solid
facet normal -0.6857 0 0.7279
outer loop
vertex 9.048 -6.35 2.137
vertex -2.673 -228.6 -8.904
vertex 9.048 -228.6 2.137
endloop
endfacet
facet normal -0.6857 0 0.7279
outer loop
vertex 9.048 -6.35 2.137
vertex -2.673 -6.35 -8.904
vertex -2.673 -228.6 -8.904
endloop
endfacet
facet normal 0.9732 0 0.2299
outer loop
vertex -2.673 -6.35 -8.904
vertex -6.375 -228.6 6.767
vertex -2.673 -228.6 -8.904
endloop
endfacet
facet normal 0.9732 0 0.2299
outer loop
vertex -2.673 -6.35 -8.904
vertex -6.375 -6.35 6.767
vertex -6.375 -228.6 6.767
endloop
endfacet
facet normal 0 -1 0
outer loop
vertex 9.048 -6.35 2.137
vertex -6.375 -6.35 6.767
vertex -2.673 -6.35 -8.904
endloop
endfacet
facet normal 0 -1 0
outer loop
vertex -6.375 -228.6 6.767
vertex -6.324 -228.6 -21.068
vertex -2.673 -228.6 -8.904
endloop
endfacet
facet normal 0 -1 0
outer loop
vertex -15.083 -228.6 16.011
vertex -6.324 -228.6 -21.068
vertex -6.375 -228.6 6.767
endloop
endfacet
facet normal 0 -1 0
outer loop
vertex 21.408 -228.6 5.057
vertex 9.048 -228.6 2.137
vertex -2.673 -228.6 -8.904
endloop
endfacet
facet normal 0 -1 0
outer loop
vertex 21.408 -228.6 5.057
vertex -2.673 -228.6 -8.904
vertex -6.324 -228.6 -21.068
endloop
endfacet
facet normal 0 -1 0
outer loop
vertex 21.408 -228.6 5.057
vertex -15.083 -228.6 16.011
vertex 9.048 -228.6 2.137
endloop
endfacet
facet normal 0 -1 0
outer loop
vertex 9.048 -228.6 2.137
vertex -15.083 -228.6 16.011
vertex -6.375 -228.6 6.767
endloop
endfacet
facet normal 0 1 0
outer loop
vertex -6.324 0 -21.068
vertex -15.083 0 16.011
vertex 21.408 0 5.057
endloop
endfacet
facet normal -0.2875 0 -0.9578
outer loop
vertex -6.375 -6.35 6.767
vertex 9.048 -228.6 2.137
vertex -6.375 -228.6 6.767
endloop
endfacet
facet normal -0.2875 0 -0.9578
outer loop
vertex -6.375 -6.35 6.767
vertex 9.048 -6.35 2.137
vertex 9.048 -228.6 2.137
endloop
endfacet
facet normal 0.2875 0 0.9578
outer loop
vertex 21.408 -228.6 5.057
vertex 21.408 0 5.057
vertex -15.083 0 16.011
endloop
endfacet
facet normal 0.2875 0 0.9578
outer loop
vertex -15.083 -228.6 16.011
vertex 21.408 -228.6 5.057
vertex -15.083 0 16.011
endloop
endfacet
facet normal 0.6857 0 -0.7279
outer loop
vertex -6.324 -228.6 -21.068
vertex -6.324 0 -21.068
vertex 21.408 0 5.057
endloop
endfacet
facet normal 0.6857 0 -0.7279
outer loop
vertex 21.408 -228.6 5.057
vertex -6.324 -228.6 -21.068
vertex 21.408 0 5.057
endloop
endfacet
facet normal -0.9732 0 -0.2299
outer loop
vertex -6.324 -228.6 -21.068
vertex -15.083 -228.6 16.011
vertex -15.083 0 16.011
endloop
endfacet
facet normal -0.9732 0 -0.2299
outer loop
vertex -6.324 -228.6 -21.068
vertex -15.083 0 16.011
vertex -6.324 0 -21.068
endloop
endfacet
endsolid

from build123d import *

# Parameters (mm, degrees)
F1_DEPTH = 228.6
F2_T     = -6.35


with BuildPart() as f1:
    # F0 (on Front) → F1 (new body)
    with BuildSketch(Plane.XZ):
        Polygon((21.407872, 5.056975), (-15.083405, 16.011274), (-6.324467, -21.068249), align=None)
    extrude(amount=F1_DEPTH)

    # F2
    f2_openings = [f1.faces().sort_by_distance(p)[0] for p in [
        (0, -228.6, 0),
    ]]
    offset(amount=F2_T, openings=f2_openings)


solid = f1.part
